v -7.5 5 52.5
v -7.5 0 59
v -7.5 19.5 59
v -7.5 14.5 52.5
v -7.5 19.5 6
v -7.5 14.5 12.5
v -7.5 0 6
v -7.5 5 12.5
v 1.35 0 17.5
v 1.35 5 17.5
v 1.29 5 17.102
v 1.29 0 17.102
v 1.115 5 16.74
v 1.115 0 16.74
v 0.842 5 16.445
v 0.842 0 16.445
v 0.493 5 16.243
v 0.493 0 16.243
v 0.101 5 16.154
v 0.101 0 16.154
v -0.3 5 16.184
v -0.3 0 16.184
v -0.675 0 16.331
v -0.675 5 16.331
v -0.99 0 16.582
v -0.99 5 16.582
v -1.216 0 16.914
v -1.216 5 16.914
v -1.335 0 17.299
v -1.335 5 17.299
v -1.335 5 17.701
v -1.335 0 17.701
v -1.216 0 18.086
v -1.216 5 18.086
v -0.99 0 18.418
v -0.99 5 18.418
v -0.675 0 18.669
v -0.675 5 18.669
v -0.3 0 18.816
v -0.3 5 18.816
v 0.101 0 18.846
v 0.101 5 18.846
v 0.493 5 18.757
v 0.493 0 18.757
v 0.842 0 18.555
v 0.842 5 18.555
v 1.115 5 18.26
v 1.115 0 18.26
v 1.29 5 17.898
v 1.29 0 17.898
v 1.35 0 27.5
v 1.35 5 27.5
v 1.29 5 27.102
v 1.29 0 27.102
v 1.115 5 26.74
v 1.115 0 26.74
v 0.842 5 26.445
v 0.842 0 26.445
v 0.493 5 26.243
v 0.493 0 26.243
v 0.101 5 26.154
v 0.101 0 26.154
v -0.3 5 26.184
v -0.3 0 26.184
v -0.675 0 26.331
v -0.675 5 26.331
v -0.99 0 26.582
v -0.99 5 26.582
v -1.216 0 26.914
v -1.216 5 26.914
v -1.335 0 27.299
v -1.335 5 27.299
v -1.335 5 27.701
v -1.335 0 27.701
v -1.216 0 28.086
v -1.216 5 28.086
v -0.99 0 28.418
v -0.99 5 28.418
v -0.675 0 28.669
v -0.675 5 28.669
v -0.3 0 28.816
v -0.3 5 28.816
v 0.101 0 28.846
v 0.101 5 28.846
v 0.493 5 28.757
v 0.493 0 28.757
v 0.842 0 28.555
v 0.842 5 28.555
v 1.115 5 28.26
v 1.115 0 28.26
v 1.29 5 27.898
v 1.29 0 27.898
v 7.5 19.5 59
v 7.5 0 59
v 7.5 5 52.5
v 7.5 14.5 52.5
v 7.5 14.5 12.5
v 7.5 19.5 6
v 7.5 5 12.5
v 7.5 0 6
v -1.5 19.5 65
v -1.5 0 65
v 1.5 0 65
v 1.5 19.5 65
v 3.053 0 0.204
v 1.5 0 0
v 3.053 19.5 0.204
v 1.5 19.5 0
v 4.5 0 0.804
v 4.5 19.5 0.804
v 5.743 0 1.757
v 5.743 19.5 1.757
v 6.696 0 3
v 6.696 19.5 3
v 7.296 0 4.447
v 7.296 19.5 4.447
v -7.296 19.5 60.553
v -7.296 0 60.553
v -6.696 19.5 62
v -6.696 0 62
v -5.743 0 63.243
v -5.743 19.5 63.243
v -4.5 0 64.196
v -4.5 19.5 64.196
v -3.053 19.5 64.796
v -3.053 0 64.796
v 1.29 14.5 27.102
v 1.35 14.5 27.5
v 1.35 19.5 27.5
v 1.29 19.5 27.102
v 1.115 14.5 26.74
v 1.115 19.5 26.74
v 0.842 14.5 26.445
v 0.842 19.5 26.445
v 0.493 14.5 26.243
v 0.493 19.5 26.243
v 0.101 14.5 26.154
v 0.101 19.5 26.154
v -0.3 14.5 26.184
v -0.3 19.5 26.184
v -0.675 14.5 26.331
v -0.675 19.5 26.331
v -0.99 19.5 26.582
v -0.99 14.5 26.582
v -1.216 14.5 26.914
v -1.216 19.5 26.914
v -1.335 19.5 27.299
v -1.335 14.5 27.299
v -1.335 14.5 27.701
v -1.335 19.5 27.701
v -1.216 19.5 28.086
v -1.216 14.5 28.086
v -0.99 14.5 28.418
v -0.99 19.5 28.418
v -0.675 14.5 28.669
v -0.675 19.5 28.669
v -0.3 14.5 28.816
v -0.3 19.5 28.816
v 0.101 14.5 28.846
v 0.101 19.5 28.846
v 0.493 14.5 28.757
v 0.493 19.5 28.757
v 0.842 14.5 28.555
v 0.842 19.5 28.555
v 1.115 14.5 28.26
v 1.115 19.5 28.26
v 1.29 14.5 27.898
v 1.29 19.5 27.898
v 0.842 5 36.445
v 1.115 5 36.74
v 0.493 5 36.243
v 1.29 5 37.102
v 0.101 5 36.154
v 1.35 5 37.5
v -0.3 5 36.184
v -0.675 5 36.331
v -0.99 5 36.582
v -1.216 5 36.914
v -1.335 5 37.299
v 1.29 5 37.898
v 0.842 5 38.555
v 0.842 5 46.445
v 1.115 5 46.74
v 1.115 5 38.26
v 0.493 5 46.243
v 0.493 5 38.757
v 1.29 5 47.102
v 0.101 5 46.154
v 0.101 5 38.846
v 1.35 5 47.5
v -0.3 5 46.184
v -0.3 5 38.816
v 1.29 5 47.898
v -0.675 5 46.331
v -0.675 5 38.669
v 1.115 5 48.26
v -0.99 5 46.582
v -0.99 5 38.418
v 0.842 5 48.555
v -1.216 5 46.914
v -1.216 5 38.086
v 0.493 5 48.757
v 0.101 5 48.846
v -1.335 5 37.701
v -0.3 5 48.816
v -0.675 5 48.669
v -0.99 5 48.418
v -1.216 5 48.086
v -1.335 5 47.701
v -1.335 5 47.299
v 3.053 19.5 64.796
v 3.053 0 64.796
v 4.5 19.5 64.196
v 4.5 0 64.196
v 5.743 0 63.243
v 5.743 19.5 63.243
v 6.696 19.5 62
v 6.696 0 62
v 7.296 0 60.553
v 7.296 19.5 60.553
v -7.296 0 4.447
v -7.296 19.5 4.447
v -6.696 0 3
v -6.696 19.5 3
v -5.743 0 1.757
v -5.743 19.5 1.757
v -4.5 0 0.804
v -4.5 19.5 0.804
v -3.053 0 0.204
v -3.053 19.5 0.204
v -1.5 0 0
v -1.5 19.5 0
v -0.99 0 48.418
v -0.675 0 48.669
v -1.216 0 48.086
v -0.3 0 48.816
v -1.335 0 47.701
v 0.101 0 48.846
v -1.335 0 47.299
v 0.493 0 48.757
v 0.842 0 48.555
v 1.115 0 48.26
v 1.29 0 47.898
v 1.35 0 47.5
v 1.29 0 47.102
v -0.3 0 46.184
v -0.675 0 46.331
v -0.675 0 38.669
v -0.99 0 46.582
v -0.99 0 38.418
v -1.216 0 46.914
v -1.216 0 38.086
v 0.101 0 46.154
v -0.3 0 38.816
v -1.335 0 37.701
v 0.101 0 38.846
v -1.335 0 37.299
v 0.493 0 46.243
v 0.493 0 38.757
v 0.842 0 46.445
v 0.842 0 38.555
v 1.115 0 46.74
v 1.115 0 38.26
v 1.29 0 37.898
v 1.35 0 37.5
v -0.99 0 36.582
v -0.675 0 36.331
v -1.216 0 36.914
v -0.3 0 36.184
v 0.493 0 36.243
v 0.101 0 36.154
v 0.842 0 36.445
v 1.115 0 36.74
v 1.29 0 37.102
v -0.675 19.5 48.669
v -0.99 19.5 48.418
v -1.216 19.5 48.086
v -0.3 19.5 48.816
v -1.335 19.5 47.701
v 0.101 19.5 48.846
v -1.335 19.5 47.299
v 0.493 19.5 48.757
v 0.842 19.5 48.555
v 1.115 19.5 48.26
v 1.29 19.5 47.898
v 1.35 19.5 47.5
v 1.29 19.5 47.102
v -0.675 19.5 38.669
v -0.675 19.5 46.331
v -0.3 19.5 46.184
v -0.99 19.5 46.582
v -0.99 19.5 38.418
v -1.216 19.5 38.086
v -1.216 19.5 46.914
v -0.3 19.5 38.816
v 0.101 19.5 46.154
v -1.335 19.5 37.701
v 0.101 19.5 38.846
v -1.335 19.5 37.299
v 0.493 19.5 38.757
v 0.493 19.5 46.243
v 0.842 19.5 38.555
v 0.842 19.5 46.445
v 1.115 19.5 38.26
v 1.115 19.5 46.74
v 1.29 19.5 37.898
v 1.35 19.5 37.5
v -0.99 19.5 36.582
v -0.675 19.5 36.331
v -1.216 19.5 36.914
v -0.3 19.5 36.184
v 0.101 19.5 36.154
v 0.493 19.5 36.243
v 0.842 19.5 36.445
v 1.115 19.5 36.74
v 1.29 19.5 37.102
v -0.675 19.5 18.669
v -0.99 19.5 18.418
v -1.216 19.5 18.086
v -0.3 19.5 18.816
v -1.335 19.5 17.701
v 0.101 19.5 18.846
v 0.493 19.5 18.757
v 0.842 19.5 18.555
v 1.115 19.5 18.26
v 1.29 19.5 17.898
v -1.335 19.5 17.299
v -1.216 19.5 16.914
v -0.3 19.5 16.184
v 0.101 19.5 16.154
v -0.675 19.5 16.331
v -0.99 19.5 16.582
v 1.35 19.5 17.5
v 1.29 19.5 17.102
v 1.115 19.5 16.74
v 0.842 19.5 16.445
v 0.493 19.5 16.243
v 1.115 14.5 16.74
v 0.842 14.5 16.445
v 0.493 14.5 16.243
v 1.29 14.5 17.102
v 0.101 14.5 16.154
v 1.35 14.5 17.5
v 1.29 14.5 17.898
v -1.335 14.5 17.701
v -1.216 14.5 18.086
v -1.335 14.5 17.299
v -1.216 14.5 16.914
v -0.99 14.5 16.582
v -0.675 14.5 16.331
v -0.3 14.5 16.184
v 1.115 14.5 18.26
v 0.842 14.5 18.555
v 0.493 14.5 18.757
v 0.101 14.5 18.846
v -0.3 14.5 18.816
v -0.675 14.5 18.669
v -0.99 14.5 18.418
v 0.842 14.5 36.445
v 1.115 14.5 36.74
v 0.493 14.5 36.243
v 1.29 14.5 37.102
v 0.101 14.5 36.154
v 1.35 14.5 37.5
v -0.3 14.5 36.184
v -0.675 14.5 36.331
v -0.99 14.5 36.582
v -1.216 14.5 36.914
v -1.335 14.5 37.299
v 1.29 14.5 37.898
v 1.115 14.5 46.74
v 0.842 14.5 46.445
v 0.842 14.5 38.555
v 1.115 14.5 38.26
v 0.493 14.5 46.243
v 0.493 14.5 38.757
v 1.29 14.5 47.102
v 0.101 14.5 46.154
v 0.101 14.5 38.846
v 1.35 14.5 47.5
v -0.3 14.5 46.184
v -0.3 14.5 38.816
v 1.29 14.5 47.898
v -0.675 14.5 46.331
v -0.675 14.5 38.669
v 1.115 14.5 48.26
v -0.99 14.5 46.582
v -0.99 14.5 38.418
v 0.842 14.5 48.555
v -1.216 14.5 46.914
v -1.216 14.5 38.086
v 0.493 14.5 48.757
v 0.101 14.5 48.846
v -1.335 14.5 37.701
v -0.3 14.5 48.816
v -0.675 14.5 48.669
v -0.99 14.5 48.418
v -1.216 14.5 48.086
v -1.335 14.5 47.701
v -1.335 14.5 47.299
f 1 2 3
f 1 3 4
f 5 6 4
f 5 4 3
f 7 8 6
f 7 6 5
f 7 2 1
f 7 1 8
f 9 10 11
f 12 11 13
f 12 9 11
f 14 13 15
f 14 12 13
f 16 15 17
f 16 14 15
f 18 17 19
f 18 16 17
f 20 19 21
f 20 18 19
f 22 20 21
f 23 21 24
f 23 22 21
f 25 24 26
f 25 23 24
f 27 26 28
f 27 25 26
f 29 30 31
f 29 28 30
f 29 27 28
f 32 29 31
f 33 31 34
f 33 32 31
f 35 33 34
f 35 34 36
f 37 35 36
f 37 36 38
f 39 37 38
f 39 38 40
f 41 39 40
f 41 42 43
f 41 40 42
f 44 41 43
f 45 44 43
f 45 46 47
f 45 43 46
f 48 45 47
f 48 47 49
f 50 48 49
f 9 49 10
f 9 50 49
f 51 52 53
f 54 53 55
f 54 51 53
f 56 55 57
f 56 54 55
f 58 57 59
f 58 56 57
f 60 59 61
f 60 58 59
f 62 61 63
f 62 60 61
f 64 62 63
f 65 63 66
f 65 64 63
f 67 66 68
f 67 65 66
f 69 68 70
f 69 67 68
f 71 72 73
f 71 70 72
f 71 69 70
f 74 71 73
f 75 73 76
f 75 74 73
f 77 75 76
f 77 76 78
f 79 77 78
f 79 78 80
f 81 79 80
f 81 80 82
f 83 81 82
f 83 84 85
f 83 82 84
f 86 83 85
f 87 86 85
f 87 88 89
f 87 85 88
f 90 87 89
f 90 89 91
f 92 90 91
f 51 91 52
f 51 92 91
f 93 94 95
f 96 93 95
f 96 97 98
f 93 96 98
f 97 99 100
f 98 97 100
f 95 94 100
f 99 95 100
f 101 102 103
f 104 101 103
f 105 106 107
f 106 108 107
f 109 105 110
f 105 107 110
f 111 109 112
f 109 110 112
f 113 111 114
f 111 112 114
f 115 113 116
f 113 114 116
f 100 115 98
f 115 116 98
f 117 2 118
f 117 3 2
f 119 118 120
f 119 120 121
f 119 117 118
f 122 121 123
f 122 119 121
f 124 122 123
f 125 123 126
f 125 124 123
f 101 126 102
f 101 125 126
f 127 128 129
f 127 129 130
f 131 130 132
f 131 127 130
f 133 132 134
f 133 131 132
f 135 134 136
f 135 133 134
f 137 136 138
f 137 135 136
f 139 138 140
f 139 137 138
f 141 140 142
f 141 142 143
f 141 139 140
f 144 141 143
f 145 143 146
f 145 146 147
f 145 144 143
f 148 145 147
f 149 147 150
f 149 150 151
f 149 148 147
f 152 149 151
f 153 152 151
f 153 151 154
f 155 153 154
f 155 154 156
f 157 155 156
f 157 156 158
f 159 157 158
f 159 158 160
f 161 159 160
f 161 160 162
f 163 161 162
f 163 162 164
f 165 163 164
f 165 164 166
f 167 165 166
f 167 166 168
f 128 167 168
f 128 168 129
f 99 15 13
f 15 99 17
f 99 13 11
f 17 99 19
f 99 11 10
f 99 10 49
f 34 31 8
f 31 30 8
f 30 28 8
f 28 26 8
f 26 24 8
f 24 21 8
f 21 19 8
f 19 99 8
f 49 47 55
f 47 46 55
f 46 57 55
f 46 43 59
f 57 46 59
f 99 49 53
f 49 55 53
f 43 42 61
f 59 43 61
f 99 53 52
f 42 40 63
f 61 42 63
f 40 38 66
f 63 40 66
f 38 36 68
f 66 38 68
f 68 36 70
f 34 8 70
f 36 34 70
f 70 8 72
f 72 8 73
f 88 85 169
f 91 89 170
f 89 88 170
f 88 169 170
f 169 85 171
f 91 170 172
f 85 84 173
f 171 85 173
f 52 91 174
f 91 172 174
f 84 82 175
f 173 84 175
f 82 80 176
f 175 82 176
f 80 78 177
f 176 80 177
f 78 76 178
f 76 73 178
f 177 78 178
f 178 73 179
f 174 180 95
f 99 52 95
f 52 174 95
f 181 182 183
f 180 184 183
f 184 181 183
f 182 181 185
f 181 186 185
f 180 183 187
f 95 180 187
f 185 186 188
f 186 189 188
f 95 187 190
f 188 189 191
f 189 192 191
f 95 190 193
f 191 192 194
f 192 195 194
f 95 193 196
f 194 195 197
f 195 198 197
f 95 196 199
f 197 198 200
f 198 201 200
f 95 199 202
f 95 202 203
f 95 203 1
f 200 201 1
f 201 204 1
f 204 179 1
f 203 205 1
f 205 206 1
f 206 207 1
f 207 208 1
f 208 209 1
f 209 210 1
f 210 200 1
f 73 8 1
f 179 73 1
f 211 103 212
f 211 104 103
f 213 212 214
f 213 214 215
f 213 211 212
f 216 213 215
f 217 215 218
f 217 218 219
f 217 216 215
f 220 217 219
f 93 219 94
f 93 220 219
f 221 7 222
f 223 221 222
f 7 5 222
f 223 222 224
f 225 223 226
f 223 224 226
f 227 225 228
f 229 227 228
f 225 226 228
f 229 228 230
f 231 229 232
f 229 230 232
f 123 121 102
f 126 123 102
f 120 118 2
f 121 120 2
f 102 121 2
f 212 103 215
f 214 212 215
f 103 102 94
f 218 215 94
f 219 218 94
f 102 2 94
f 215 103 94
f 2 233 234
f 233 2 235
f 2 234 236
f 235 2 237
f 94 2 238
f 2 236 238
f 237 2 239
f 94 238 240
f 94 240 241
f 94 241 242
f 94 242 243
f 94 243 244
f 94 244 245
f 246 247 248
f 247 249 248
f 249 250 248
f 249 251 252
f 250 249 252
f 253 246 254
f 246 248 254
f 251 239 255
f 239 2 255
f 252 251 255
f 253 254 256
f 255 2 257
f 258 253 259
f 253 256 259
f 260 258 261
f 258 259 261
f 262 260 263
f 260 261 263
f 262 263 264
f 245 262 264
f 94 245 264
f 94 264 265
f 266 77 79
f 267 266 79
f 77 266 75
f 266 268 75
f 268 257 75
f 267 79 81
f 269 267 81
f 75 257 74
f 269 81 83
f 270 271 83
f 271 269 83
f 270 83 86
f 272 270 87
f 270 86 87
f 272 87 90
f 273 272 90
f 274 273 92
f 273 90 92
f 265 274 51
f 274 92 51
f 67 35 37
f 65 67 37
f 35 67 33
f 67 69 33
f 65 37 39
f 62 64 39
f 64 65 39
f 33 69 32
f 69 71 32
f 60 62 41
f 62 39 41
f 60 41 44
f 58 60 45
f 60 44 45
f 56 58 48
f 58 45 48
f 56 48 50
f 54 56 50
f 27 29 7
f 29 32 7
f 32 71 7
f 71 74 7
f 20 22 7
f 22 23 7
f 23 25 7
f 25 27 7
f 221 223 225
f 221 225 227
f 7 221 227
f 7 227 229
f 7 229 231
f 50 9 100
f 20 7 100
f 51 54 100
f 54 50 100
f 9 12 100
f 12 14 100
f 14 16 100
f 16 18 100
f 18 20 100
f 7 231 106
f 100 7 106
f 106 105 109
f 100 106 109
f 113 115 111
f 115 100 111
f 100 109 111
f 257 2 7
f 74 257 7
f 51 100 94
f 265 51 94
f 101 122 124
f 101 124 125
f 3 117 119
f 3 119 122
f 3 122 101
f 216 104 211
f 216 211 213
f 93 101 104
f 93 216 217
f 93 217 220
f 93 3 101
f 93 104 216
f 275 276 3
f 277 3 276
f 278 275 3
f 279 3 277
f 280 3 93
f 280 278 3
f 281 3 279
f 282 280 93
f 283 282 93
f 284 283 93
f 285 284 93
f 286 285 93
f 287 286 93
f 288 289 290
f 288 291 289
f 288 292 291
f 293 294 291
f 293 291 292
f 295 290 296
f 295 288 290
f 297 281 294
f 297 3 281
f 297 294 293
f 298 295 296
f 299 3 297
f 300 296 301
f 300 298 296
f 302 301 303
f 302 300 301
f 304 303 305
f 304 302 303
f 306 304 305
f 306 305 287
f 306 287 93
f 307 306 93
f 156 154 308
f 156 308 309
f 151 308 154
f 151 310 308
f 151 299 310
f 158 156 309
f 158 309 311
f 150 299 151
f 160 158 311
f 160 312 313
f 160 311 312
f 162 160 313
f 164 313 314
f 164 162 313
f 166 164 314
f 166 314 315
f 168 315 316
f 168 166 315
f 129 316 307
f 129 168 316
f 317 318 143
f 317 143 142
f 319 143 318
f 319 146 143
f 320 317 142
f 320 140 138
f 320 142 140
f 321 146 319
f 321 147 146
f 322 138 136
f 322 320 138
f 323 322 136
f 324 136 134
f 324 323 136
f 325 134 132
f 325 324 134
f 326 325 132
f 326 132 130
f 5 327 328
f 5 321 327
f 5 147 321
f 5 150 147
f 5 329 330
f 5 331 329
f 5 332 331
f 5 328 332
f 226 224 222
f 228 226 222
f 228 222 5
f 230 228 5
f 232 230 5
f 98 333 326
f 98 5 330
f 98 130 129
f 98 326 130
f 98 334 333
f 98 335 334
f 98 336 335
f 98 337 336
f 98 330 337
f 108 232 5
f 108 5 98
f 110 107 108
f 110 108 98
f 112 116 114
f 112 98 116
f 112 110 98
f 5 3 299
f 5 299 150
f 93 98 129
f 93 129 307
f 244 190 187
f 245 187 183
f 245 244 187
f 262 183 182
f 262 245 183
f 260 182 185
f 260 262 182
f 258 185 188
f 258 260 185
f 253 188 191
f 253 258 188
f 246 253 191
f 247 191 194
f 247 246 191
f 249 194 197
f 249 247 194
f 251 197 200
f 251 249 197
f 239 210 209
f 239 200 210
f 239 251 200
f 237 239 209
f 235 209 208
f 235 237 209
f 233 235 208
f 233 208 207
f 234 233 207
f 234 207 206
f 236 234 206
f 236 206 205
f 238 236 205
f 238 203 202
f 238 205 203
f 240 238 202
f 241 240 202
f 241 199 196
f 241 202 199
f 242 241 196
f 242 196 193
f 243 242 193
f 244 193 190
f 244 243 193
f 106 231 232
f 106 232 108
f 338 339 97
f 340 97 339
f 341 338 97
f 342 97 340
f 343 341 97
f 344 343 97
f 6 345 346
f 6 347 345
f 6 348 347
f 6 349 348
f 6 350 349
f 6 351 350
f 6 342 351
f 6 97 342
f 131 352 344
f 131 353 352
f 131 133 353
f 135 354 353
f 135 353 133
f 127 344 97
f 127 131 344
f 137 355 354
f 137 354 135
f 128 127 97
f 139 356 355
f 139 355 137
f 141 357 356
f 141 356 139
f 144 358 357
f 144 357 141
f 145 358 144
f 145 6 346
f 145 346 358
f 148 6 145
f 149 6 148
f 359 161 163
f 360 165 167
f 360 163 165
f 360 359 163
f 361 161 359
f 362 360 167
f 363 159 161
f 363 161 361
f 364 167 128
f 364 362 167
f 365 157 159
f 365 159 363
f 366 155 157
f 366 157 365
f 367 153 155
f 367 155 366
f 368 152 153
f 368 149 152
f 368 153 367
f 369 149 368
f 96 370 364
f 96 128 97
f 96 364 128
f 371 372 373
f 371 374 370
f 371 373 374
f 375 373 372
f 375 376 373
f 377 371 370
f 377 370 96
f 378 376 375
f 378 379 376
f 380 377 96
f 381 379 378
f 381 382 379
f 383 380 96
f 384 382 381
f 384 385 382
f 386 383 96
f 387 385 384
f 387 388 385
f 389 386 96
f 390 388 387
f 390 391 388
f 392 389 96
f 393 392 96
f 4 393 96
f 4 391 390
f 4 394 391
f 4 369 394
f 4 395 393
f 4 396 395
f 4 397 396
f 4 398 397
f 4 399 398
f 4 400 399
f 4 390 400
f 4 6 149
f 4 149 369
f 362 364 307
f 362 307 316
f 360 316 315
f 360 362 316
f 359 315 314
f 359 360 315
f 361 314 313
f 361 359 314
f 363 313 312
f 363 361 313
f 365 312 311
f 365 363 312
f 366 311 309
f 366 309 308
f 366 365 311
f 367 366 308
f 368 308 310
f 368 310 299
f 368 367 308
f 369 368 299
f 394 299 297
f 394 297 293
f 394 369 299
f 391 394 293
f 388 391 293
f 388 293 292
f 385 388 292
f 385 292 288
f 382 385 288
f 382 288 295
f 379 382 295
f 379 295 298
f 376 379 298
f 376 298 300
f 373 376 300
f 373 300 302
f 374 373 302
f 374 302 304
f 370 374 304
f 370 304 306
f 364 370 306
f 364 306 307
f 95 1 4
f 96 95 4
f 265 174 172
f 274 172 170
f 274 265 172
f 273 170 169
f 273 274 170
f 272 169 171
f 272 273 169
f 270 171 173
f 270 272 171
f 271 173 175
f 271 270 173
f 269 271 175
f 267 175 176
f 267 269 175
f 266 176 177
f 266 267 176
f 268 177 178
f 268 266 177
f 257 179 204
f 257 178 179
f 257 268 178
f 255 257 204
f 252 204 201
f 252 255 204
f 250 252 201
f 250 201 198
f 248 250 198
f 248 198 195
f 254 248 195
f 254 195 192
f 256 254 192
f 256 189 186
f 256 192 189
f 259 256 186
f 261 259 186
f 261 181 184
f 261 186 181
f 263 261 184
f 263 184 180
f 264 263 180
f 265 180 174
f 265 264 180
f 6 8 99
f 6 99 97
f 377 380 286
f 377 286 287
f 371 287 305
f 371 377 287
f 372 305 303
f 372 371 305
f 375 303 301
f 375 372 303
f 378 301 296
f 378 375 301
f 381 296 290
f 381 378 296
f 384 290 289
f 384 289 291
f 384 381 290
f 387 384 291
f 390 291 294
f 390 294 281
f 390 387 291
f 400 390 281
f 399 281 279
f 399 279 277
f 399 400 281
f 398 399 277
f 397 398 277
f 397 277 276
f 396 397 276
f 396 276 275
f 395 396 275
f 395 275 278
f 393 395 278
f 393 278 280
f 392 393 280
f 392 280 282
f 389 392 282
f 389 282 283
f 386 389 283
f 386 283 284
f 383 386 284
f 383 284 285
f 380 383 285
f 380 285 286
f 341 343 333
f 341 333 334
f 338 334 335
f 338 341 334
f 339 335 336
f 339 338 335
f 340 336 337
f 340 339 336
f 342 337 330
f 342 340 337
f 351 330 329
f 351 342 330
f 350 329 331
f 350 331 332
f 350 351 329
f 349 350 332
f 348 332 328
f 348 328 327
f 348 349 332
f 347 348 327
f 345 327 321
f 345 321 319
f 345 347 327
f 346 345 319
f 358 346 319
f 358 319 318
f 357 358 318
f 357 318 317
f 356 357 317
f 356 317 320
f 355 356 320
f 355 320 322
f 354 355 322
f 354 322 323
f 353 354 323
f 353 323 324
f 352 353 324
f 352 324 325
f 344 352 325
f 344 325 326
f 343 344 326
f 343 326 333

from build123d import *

# Parameters (mm, degrees)
SKETCH1_W           = 15
SKETCH1_H           = 65
SKETCH1_R           = 1.35
BOSS_EXTRUDE1_DEPTH = 19.5
FILLET1_R           = 6
SKETCH2_W           = 40
SKETCH2_H           = 9.5
CUT_EXTRUDE1_DEPTH  = 20


with BuildPart() as part:
    # Sketch1 → Boss-Extrude1 (new body)
    with BuildSketch(Plane(origin=(0, 0, 0), x_dir=(1, 0, 0), z_dir=(0, 1, 0))):
        with Locations((0, -32.5)):
            Rectangle(SKETCH1_W, SKETCH1_H)
        with Locations((0, -17.5)):
            Circle(SKETCH1_R, mode=Mode.SUBTRACT)
        with Locations((0, -27.5)):
            Circle(SKETCH1_R, mode=Mode.SUBTRACT)
        with Locations((0, -37.5)):
            Circle(SKETCH1_R, mode=Mode.SUBTRACT)
        with Locations((0, -47.5)):
            Circle(SKETCH1_R, mode=Mode.SUBTRACT)
    extrude(amount=BOSS_EXTRUDE1_DEPTH)

    # Fillet1
    fillet1_edges = [part.edges().sort_by_distance(p)[0] for p in [
        (-7.5, 9.75, 0),
        (7.5, 9.75, 0),
        (7.5, 9.75, 65),
        (-7.5, 9.75, 65),
    ]]
    fillet(fillet1_edges, radius=FILLET1_R)

    # Sketch2 → Cut-Extrude1 (cut)
    with BuildSketch(Plane.ZY.offset(7.5)):
        with Locations((32.5, 9.75)):
            Rectangle(SKETCH2_W, SKETCH2_H)
    extrude(amount=-CUT_EXTRUDE1_DEPTH, mode=Mode.SUBTRACT)


solid = part.part
